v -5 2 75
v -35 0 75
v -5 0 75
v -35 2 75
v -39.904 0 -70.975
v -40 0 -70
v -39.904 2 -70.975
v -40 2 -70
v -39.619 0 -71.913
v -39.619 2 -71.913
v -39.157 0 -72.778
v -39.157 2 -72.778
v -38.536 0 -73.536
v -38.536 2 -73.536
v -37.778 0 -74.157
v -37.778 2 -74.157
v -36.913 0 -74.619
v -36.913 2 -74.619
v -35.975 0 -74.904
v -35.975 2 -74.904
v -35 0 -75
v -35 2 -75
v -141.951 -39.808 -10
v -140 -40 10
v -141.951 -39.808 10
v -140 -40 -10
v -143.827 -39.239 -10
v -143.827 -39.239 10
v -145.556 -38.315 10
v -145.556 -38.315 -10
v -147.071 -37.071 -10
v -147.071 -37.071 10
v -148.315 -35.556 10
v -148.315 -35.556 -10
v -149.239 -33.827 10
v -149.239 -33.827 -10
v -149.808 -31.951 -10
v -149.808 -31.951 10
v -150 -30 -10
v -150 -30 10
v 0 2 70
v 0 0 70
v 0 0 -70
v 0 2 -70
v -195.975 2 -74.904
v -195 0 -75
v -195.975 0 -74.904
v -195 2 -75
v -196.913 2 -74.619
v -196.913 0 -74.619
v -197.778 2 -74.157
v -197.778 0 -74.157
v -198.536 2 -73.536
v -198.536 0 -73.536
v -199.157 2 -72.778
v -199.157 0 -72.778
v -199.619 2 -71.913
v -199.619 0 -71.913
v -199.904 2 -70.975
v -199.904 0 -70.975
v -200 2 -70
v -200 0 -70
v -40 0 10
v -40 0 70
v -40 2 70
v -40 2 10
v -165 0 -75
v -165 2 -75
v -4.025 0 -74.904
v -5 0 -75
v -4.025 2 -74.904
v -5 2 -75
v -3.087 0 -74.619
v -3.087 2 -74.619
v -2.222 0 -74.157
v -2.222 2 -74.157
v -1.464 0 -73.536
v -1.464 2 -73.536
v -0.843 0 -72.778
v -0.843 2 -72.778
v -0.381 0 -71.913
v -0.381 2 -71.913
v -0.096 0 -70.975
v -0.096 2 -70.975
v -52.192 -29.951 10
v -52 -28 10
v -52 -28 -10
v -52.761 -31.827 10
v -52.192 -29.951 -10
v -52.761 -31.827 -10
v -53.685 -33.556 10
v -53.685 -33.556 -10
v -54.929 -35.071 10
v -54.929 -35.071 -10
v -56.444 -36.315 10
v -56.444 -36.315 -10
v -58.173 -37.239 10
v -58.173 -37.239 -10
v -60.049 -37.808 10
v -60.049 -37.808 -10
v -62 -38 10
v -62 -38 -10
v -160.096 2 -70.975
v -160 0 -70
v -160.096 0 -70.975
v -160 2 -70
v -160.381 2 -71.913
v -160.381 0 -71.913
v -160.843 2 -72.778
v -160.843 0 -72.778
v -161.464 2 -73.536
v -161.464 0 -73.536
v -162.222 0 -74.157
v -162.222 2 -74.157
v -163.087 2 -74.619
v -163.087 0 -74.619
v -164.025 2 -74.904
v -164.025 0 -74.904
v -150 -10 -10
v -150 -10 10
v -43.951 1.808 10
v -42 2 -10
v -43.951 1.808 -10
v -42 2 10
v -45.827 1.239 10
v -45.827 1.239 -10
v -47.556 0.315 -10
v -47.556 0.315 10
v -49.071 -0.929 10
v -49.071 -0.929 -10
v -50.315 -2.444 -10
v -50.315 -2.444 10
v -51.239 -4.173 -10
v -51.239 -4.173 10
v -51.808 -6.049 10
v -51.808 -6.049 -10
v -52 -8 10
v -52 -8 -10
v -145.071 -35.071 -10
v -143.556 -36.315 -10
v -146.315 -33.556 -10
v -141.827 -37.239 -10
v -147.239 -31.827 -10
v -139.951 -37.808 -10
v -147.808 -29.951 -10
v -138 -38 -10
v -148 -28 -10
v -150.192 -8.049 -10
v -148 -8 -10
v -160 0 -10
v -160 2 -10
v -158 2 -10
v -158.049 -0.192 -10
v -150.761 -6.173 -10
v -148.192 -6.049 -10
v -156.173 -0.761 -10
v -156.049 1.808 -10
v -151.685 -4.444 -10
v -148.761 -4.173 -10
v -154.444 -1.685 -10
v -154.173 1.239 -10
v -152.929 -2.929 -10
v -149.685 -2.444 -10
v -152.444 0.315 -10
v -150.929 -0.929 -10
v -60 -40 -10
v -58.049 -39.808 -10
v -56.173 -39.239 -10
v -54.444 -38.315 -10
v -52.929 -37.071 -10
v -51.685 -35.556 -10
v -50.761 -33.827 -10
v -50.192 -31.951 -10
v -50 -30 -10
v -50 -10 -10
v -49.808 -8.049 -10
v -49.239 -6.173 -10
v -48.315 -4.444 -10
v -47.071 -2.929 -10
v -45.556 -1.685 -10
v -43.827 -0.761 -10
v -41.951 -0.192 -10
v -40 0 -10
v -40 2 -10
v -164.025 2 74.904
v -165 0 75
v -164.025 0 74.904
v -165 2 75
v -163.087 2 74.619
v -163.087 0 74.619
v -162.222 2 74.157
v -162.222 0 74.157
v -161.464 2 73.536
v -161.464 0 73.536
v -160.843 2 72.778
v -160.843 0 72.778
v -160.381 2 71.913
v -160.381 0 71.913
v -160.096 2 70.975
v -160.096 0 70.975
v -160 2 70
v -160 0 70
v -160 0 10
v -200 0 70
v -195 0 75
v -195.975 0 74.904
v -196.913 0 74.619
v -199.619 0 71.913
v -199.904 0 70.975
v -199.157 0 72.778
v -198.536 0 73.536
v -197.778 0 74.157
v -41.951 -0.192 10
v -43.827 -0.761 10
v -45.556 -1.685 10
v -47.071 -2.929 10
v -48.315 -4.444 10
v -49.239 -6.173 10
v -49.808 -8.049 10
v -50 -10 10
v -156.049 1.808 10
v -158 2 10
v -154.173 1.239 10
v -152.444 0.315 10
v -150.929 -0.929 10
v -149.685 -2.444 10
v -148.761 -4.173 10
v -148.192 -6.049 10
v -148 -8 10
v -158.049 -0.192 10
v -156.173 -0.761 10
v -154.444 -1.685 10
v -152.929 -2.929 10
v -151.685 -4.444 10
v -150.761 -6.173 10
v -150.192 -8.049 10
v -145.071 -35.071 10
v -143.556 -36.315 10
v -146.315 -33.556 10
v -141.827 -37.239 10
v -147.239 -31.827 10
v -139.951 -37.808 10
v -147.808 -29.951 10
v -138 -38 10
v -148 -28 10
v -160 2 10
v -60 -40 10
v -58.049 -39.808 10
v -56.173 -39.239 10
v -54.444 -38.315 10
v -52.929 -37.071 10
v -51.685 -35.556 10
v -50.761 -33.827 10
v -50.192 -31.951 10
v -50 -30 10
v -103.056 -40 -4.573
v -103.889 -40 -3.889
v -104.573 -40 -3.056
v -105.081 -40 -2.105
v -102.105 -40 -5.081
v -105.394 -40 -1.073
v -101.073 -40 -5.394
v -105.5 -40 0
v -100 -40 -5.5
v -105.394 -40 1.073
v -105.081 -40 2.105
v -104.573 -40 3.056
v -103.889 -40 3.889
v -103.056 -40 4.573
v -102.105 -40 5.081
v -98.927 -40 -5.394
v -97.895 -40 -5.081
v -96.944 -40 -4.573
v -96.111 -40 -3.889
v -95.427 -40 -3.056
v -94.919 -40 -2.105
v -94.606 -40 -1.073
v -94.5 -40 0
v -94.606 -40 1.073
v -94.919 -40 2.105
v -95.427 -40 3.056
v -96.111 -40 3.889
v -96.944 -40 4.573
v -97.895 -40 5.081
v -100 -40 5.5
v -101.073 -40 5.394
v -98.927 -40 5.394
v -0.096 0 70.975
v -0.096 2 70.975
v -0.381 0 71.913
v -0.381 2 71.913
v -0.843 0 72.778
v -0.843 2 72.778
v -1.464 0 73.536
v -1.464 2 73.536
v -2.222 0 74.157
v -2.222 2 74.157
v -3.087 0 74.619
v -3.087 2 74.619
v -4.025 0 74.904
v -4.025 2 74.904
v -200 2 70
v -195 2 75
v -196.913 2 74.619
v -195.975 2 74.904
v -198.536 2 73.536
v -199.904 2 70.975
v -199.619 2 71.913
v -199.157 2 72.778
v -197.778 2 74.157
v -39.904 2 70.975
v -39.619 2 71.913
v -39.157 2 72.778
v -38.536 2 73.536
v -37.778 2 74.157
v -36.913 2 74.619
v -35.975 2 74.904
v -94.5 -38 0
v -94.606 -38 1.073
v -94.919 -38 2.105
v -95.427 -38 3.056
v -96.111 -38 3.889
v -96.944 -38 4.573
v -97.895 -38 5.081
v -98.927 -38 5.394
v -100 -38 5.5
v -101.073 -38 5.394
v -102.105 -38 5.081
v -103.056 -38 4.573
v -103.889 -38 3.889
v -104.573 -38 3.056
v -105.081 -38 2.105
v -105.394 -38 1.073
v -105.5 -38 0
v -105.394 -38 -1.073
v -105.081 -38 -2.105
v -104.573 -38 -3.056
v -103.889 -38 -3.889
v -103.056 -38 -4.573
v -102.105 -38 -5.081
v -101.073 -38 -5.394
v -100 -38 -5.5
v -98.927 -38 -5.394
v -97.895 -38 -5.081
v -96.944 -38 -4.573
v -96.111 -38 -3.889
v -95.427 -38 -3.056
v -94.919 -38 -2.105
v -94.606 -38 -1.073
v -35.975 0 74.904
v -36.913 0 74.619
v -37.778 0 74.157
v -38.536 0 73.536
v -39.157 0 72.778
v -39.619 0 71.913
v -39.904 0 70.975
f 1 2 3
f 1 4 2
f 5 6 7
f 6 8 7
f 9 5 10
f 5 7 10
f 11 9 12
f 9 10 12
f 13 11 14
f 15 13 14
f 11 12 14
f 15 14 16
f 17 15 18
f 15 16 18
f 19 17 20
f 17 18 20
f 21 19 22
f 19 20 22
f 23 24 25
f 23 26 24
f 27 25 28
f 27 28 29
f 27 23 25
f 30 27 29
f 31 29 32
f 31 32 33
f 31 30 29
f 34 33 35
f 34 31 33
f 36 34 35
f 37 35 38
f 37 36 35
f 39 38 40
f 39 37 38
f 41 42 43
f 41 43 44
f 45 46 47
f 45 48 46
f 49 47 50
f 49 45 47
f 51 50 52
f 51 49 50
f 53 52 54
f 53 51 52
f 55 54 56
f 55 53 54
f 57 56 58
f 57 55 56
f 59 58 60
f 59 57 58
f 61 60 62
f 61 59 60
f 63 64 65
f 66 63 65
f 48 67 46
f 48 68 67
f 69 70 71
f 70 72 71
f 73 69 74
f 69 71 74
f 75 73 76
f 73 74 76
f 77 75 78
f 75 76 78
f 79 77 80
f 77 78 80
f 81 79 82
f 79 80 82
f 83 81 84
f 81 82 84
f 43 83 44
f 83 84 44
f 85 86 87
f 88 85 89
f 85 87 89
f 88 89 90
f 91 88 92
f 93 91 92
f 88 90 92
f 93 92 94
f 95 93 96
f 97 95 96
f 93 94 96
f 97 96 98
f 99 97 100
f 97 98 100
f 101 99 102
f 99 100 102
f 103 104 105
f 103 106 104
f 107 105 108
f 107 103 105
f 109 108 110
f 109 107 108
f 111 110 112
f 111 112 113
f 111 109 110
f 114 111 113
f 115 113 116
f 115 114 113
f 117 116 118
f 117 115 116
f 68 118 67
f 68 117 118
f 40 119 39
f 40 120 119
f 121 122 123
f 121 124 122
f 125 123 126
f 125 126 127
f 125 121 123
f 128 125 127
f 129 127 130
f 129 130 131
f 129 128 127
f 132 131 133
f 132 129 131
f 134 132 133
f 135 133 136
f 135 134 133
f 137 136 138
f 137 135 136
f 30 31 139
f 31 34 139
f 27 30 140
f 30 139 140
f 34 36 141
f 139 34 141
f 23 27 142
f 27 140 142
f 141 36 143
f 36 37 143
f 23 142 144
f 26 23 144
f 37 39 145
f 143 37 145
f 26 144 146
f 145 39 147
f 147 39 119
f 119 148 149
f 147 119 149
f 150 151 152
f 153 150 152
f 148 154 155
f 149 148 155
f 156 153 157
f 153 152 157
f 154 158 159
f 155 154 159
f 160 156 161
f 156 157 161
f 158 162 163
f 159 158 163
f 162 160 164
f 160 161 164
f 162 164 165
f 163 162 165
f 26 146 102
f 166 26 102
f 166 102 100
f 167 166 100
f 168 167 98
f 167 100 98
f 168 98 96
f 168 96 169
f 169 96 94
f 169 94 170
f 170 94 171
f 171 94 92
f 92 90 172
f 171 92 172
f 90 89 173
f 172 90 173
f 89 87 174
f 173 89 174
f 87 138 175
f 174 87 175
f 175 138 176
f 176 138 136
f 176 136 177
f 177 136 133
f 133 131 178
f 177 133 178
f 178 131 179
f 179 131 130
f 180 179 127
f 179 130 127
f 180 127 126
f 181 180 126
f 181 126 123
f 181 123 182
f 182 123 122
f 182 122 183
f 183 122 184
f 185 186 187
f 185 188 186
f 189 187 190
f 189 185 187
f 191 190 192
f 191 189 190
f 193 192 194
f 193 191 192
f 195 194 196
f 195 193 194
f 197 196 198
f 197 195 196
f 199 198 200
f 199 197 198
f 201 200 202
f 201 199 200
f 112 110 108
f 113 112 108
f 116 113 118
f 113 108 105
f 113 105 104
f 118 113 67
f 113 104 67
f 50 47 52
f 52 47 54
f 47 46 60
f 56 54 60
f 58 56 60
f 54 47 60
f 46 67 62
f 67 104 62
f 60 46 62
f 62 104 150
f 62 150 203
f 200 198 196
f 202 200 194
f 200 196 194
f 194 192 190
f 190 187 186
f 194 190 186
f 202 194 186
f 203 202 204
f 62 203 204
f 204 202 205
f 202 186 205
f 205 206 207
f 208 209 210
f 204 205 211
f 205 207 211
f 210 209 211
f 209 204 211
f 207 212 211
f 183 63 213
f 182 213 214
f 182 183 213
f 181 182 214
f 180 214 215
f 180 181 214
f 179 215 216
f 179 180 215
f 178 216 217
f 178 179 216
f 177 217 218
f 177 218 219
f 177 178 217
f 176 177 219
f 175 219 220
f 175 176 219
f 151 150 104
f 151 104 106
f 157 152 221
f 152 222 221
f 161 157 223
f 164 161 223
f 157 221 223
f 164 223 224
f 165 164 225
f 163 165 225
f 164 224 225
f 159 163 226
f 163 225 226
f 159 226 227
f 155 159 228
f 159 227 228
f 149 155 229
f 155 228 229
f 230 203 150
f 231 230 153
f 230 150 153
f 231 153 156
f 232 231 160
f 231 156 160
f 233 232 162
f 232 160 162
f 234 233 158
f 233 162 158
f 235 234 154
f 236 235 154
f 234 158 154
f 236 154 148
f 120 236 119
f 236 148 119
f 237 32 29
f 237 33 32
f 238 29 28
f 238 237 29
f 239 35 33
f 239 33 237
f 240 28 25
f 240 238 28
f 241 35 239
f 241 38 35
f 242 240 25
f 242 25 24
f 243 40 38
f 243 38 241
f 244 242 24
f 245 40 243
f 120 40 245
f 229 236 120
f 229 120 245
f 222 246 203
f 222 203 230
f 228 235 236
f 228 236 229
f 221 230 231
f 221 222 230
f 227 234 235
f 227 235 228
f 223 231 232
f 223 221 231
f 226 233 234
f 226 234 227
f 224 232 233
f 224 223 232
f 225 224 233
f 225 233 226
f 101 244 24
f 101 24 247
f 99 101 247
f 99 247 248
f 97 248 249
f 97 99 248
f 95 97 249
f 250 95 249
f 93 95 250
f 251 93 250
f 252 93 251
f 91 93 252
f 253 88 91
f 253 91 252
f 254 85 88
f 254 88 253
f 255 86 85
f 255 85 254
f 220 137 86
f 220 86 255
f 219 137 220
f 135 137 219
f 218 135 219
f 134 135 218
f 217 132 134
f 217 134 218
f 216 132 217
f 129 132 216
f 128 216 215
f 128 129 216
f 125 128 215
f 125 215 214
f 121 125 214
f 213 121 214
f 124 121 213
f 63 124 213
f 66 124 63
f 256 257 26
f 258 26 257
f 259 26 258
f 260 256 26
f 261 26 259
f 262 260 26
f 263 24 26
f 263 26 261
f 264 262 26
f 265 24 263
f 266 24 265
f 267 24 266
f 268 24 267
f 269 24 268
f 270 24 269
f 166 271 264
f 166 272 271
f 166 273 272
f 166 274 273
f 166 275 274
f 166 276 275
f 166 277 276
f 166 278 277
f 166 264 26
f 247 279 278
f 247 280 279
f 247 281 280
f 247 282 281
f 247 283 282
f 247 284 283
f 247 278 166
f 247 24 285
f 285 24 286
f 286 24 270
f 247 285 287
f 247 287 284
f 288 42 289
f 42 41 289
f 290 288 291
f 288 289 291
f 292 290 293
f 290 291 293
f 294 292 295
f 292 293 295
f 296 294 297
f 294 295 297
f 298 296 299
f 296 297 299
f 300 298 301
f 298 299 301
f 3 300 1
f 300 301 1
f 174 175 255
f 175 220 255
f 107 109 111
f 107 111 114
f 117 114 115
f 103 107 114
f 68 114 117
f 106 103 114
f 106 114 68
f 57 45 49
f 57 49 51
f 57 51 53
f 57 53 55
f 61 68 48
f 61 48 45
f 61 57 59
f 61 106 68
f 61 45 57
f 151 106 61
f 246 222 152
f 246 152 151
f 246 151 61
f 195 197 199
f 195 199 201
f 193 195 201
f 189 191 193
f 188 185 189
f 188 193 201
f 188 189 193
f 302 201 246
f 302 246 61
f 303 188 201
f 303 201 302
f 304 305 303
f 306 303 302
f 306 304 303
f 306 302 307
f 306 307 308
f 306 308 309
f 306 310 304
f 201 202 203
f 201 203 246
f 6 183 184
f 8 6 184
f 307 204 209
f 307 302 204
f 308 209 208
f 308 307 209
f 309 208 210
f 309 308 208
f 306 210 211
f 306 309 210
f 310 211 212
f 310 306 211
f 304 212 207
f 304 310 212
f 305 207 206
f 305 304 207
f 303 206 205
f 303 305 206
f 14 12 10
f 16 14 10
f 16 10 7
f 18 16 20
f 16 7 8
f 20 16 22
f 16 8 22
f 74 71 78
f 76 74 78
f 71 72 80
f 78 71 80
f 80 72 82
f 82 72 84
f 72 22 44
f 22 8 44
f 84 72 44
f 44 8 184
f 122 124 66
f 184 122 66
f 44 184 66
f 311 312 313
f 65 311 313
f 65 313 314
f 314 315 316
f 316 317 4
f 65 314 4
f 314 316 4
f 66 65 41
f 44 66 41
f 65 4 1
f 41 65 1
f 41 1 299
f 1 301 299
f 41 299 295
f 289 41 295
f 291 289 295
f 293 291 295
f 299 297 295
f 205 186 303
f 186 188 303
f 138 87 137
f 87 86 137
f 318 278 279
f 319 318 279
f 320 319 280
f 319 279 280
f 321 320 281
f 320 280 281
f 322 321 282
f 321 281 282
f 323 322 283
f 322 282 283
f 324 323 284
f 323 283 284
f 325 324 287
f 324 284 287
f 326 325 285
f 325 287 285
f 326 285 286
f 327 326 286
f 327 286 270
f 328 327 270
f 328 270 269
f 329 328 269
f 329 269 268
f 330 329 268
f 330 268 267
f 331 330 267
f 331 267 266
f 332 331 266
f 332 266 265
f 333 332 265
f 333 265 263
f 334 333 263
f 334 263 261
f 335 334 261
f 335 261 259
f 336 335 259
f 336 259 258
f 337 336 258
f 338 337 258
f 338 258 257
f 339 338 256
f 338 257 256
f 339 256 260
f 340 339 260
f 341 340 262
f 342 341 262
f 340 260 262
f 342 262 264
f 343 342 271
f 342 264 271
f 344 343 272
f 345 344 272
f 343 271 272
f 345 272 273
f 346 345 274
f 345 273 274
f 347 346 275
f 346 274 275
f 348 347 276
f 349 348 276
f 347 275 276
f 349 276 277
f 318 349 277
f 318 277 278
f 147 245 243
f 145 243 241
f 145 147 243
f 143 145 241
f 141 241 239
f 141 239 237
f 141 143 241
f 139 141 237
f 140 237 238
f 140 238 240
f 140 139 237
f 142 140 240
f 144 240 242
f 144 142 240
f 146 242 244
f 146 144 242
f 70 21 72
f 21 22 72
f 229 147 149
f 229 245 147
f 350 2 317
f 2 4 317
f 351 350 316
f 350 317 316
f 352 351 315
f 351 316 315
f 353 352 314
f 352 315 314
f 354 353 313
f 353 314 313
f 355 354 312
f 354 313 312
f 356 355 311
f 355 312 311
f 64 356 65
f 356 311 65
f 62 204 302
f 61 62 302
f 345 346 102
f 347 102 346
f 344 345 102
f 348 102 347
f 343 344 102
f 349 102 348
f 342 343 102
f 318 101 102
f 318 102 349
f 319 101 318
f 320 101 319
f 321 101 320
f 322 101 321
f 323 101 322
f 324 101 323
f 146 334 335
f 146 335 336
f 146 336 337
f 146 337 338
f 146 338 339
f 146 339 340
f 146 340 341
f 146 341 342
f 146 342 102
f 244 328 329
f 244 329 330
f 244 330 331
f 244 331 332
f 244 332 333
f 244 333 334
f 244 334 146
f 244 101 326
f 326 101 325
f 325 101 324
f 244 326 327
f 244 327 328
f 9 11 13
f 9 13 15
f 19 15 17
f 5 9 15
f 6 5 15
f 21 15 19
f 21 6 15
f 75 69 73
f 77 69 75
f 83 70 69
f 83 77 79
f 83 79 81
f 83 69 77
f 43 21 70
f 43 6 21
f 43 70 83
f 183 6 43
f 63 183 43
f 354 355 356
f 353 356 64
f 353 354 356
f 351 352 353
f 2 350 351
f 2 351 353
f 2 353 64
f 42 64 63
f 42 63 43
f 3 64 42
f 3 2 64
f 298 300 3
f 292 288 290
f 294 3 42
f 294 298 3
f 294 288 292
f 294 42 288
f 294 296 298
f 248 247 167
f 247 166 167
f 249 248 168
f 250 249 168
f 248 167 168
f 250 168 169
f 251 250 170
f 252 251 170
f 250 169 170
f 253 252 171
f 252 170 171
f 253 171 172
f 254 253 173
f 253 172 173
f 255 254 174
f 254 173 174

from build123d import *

# Parameters (mm, degrees)
BOSS_EXTRUDE1_DEPTH = 10
FILLET1_R           = 10
SKETCH2_W           = 40
SKETCH2_H           = 2
BOSS_EXTRUDE2_DEPTH = 75
FILLET2_R           = 5
CUT_EXTRUDE1_REACH  = 219.69
SKETCH4_R           = 5.5


with BuildPart() as part:
    # Sketch1 → Boss-Extrude1 (new, symmetric)
    with BuildSketch(Plane.XY):
        Polygon((0, 0), (-50, 0), (-50, -40), (-100, -40), (-100, -38), (-52, -38), (-52, 2), (0, 2), align=None)
    extrude(amount=BOSS_EXTRUDE1_DEPTH, both=True)

    # Fillet1
    fillet1_edges = [part.edges().sort_by_distance(p)[0] for p in [
        (-50, 0, 0),
        (-50, -40, 0),
        (-52, -38, 0),
        (-52, 2, 0),
    ]]
    fillet(fillet1_edges, radius=FILLET1_R)

    # Sketch2 → Boss-Extrude2 (add, symmetric)
    with BuildSketch(Plane.XY):
        with Locations((-20, 1)):
            Rectangle(SKETCH2_W, SKETCH2_H)
    extrude(amount=BOSS_EXTRUDE2_DEPTH, both=True)

    # Fillet2
    fillet2_edges = [part.edges().sort_by_distance(p)[0] for p in [
        (-40, 1, -75),
        (0, 1, -75),
        (-40, 1, 75),
        (0, 1, 75),
    ]]
    fillet(fillet2_edges, radius=FILLET2_R)

    # Mirror1: part across plane


with BuildPart() as part_1:
    add(part.part)
    add(part.part.mirror(Plane(origin=(-100, -38, 10), x_dir=(0, 0, 1), z_dir=(1, 0, 0))))

    # Sketch4 → Cut-Extrude1 (cut, up to next)
    with BuildSketch(Plane.XZ.offset(40), mode=Mode.PRIVATE) as cut_extrude1_sk1:
        with Locations((-100, 0)):
            Circle(SKETCH4_R)
    cut_extrude1_tool1 = extrude(cut_extrude1_sk1.sketch, amount=-CUT_EXTRUDE1_REACH, mode=Mode.PRIVATE) & part_1.part
    add(cut_extrude1_tool1.solids().sort_by_distance((-100, -40, 0))[0], mode=Mode.SUBTRACT)


solid = part_1.part
